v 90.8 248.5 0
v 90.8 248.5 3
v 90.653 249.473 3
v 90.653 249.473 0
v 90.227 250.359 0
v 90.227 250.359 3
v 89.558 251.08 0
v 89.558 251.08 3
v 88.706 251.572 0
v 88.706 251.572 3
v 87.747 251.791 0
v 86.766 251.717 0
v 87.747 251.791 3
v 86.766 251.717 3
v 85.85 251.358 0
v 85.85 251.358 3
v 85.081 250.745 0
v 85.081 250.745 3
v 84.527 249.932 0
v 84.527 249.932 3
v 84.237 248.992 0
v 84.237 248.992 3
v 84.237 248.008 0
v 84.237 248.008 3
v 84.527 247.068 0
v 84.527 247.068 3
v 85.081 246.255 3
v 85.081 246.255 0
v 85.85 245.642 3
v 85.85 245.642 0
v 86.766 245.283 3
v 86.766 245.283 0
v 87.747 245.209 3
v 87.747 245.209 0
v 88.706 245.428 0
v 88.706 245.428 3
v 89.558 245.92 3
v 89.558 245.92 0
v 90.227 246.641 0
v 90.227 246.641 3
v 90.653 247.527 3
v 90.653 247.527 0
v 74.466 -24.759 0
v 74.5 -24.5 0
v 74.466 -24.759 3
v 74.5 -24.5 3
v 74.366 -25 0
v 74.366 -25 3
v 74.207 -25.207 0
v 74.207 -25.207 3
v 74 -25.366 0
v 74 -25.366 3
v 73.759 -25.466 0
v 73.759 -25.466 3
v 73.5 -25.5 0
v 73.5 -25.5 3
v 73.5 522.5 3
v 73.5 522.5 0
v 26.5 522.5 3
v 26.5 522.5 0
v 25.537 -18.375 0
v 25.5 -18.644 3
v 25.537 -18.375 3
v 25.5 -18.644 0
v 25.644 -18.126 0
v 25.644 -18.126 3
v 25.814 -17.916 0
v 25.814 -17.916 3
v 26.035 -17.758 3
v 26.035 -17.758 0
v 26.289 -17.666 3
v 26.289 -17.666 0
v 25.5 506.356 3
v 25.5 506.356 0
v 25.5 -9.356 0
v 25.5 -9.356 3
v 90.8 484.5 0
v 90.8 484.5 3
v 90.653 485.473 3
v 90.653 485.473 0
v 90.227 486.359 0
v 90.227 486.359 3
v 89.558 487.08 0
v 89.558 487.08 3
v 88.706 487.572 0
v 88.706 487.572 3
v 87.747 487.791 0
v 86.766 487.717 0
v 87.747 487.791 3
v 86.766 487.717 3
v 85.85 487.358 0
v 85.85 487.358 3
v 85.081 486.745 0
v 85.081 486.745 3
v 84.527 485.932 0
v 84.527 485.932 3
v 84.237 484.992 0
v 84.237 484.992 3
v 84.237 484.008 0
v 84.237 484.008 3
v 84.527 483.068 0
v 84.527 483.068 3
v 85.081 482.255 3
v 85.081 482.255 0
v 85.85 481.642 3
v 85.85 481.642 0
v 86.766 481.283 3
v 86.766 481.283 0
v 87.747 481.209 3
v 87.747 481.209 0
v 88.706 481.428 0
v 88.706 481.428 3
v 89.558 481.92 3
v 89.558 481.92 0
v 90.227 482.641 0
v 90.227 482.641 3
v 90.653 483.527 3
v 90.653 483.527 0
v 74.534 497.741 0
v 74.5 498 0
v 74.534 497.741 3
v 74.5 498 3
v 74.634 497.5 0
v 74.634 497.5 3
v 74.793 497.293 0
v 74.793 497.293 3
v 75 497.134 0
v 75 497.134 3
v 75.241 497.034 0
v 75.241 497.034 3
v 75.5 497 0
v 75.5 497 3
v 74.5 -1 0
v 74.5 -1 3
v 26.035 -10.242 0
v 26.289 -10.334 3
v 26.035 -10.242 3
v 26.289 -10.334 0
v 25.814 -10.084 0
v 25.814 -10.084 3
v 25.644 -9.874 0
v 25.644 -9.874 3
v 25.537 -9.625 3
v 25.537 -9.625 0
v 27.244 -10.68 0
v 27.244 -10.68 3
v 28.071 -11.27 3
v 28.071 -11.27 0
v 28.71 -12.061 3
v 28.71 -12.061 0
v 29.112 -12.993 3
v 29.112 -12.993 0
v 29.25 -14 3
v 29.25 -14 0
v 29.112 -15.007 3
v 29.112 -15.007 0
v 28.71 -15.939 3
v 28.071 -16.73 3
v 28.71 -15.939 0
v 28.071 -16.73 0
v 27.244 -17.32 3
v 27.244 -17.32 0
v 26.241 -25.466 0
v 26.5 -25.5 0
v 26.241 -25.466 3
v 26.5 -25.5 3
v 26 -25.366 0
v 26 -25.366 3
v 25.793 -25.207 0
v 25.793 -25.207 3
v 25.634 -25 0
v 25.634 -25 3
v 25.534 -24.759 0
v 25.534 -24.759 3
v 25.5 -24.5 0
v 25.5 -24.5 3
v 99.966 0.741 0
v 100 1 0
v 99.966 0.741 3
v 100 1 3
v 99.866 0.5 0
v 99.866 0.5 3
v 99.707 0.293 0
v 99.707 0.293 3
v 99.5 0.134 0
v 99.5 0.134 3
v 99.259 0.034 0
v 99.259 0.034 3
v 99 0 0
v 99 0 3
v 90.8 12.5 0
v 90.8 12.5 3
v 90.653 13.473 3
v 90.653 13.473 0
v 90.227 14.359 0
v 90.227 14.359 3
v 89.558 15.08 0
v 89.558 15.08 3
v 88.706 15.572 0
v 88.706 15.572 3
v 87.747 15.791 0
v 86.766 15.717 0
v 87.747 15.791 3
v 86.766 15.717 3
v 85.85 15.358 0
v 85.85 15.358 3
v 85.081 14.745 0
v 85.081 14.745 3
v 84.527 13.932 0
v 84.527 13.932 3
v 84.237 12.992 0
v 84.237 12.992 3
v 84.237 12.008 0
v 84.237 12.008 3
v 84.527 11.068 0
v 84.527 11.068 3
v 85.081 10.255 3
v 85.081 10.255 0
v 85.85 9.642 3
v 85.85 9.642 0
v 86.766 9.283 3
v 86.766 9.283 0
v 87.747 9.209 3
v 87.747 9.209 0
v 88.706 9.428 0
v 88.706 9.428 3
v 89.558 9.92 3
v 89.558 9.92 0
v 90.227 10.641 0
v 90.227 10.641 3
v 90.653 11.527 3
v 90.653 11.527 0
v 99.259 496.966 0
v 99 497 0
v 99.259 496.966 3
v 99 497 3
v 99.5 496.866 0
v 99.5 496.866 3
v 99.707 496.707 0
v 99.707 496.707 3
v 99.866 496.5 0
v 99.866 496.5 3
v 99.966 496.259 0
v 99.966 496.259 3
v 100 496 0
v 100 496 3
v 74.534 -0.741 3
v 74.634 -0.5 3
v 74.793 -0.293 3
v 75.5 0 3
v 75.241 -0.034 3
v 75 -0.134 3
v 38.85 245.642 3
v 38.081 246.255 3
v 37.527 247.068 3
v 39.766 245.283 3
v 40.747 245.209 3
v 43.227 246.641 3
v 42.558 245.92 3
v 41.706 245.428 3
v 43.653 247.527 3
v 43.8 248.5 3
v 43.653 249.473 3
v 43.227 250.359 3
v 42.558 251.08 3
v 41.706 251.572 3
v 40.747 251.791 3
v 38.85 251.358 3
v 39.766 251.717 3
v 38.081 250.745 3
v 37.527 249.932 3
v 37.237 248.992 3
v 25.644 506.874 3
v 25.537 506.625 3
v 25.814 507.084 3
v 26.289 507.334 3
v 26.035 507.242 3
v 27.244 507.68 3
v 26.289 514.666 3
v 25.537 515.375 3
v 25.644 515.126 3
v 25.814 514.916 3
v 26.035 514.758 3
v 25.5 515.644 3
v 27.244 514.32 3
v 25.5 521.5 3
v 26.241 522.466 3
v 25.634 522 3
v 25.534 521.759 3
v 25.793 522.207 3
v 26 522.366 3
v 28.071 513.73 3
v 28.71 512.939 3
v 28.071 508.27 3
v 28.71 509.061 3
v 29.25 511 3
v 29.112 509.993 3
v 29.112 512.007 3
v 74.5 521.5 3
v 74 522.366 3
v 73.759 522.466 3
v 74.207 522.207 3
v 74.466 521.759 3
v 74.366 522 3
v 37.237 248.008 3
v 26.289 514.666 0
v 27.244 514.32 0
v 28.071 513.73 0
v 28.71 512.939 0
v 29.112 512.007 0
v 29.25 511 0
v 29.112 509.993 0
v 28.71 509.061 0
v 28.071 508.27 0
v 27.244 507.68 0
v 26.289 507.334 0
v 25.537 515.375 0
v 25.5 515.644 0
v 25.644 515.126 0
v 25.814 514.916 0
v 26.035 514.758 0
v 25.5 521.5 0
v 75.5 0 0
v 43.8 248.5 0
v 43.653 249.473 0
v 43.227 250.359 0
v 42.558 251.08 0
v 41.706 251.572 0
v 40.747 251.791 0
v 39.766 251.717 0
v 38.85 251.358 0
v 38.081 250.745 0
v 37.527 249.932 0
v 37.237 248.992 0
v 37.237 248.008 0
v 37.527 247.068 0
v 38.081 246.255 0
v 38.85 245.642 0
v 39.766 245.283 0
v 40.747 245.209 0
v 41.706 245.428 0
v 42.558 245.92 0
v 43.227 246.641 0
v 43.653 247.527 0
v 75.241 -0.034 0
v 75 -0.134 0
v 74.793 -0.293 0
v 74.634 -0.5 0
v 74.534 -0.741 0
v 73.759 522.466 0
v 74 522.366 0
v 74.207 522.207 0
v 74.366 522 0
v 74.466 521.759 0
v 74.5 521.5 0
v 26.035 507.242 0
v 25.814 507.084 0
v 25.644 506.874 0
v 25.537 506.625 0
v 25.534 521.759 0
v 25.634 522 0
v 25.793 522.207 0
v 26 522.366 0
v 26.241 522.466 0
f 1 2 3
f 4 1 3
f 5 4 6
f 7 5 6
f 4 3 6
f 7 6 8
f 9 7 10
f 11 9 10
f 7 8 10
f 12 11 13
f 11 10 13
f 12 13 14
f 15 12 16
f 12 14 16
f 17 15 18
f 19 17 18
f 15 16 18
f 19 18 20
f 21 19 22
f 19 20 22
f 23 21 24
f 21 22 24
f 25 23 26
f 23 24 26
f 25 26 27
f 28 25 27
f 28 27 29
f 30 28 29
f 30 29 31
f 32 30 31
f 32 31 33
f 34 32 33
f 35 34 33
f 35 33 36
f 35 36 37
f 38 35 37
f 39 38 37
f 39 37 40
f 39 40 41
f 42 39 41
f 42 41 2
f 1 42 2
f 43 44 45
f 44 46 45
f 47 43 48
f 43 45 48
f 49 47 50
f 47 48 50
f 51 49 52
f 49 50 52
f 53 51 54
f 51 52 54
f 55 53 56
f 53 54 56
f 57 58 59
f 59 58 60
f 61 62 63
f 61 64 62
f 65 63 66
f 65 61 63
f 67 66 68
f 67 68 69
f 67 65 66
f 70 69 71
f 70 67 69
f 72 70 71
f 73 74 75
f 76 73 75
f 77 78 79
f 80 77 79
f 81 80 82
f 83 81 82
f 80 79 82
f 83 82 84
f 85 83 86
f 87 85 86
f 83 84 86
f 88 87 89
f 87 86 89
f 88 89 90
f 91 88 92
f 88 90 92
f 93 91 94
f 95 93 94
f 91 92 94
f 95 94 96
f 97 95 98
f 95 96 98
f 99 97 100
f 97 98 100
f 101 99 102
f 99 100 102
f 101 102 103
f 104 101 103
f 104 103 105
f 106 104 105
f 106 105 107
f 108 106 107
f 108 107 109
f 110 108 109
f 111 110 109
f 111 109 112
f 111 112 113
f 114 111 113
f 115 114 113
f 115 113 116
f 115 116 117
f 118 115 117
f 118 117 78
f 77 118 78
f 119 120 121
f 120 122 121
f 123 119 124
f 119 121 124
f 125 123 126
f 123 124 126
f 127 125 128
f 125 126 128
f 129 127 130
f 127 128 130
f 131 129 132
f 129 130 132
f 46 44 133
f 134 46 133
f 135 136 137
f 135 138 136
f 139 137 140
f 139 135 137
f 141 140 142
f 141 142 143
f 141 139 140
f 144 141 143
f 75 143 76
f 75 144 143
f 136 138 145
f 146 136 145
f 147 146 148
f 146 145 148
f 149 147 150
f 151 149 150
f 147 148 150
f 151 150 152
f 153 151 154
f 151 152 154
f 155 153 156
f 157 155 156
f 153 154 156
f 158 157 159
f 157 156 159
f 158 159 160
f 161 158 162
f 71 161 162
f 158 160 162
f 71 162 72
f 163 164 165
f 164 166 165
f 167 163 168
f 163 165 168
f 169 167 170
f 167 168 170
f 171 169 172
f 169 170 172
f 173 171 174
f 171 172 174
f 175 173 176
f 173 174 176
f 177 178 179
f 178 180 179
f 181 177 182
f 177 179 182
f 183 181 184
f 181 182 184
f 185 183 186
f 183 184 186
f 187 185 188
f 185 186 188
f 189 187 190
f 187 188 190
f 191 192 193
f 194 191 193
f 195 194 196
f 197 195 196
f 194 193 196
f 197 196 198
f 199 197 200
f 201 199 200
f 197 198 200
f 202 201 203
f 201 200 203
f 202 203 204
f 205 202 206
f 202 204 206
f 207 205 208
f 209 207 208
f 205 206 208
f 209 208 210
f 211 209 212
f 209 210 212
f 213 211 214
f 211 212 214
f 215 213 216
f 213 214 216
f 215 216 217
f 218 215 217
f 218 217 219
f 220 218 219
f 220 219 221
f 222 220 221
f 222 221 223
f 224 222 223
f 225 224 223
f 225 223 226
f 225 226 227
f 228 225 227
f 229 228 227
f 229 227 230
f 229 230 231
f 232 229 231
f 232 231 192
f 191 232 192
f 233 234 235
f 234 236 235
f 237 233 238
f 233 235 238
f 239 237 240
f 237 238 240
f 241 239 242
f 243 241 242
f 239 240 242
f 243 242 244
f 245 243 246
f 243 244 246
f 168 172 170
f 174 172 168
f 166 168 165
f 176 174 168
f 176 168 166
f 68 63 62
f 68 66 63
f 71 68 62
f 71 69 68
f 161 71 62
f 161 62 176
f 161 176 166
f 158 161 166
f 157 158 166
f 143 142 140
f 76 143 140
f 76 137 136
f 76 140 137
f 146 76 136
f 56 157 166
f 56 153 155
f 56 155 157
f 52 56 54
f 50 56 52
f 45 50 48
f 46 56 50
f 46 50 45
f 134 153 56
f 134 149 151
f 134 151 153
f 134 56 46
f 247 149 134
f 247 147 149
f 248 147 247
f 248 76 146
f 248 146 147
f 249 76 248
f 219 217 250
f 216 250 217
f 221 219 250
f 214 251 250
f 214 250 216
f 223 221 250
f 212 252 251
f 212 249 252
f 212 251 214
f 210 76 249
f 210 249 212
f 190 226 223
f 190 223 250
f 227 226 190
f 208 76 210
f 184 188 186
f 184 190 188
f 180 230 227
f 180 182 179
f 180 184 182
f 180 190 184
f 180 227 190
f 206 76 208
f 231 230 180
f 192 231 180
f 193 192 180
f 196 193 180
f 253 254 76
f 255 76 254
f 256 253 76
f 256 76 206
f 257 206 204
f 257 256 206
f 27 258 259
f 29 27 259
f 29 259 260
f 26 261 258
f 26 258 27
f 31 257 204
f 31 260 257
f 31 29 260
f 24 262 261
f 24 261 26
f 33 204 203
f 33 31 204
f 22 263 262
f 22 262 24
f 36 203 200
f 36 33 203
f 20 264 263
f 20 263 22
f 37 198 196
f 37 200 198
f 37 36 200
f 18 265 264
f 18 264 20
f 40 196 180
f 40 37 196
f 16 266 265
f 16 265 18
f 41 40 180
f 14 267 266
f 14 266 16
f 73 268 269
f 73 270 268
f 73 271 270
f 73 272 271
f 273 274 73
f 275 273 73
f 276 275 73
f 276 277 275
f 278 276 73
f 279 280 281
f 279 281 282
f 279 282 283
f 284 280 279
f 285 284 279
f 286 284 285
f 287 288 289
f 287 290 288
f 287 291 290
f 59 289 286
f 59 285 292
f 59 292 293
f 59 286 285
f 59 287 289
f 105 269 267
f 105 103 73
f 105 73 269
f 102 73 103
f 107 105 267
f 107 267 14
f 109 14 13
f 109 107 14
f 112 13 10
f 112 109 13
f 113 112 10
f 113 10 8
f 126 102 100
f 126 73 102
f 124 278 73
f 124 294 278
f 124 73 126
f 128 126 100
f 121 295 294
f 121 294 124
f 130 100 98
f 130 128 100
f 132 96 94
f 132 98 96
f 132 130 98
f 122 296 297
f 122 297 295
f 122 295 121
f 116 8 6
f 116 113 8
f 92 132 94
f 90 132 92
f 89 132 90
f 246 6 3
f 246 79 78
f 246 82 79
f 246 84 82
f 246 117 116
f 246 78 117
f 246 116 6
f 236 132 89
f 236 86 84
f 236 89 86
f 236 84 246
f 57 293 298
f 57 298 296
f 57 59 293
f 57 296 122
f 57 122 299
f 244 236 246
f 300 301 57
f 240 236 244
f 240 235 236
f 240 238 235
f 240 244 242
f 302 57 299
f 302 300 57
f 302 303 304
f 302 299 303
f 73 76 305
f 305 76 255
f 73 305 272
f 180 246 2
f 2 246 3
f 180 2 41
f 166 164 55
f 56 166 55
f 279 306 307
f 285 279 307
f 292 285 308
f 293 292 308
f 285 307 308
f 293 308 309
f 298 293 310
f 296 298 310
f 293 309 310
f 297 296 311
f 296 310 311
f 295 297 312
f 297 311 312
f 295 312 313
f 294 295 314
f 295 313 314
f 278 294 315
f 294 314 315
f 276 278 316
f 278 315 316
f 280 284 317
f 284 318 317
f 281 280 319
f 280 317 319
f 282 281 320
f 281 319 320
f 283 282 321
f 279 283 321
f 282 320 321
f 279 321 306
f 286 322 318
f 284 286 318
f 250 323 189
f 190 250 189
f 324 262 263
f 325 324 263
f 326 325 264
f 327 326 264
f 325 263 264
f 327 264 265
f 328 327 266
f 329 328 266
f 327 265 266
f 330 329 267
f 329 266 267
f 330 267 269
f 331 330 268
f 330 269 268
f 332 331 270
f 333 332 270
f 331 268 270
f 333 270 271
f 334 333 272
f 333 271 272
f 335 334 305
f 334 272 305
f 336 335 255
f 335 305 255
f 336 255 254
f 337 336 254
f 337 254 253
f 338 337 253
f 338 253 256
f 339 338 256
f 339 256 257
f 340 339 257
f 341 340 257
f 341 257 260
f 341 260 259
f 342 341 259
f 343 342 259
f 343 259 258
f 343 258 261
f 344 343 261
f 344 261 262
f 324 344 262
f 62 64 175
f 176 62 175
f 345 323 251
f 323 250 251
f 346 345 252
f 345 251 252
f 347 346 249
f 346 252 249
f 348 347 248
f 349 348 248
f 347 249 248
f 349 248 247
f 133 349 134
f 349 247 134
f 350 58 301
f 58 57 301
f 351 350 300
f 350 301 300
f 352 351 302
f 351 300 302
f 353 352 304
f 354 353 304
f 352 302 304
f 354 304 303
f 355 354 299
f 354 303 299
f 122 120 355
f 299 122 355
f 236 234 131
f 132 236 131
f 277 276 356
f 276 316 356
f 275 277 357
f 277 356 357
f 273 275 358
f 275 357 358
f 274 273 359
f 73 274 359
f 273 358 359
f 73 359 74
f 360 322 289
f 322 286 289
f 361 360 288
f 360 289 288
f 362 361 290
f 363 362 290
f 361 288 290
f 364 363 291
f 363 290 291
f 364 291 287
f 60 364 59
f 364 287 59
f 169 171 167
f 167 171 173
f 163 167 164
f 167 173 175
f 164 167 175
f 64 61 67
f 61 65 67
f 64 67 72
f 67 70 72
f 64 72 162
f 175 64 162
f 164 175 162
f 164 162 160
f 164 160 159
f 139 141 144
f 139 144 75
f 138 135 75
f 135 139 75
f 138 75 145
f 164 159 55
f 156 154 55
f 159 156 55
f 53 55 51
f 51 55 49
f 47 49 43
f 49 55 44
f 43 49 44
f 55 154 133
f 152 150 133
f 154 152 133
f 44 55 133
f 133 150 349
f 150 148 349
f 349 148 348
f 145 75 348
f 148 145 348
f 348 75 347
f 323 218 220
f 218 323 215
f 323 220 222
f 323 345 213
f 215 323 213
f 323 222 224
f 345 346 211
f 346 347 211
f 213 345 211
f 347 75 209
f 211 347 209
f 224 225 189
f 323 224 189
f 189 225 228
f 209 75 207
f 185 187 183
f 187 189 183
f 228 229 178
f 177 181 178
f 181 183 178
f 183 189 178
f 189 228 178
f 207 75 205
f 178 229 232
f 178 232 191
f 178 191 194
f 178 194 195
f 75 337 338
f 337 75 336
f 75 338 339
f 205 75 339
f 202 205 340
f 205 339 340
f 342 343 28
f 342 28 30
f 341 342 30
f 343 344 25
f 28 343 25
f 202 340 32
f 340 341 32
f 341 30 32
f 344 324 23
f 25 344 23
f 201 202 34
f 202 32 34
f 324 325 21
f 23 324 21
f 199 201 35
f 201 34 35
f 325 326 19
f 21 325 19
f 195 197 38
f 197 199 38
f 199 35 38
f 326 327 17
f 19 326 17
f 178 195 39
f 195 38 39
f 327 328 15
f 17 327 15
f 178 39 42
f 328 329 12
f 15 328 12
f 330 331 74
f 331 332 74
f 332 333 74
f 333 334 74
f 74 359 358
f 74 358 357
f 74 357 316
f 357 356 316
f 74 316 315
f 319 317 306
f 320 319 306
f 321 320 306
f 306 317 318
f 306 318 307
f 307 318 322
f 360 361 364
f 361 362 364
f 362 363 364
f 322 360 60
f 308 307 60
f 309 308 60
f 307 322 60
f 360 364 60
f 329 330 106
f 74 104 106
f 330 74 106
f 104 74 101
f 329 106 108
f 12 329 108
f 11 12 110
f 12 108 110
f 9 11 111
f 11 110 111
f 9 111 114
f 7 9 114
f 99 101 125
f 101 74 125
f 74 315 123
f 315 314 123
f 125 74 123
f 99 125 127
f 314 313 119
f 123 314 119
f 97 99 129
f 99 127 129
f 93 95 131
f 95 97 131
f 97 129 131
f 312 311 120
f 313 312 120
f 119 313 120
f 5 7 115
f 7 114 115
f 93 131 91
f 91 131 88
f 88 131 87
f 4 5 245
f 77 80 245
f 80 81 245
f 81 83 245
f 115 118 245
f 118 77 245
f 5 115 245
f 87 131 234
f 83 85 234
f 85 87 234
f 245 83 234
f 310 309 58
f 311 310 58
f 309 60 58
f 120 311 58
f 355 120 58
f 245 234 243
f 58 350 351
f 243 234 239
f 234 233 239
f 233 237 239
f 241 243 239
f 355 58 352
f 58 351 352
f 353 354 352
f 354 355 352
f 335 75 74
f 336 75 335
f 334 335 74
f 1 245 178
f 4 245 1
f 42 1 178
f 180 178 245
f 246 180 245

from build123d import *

# Parameters (mm, degrees)
BOSS_EXTRUDE1_DEPTH  = 3
M6_CLEARANCE_HOLE1_D = 6.6
M6_CLEARANCE_HOLE2_D = 6.6
SKETCH6_R            = 3.75
CUT_EXTRUDE1_DEPTH   = 532.991776252
FILLET1_R            = 1


with BuildPart() as part:
    # Sketch1 → Boss-Extrude1 (new body)
    with BuildSketch(Plane.XY):
        Polygon((25.5, 522.5), (25.5, -25.5), (74.5, -25.5), (74.5, 0), (100, 0), (100, 497), (74.5, 497), (74.5, 522.5), align=None)
    extrude(amount=BOSS_EXTRUDE1_DEPTH)

    # M6 Clearance Hole1 (through all)
    with Locations(Plane(origin=(0, 0, 0), x_dir=(-1, 0, 0), z_dir=(0, 0, -1))):
        with Locations((-87.5, 12.5), (-87.5, 484.5), (-87.5, 248.5)):
            Hole(M6_CLEARANCE_HOLE1_D / 2)

    # M6 Clearance Hole2 (through all)
    with Locations(Plane(origin=(0, 0, 0), x_dir=(-1, 0, 0), z_dir=(0, 0, -1))):
        with Locations((-40.5, 248.5)):
            Hole(M6_CLEARANCE_HOLE2_D / 2)

    # Sketch6 → Cut-Extrude1 (cut, through all)
    with BuildSketch(Plane(origin=(0, 0, 0), x_dir=(-1, 0, 0), z_dir=(0, 0, -1))):
        with Locations((-25.5, -14)):
            Circle(SKETCH6_R)
        with Locations((-25.5, 511)):
            Circle(SKETCH6_R)
    extrude(amount=-CUT_EXTRUDE1_DEPTH, mode=Mode.SUBTRACT)

    # Fillet1
    fillet1_edges = [part.edges().sort_by_distance(p)[0] for p in [
        (74.5, -25.5, 1.5),
        (25.5, -25.5, 1.5),
        (25.5, 522.5, 1.5),
        (74.5, 522.5, 1.5),
        (74.5, 497, 1.5),
        (100, 497, 1.5),
        (100, 0, 1.5),
        (74.5, 0, 1.5),
        (25.5, -17.75, 1.5),
        (25.5, -10.25, 1.5),
        (25.5, 507.25, 1.5),
        (25.5, 514.75, 1.5),
    ]]
    fillet(fillet1_edges, radius=FILLET1_R)


solid = part.part
